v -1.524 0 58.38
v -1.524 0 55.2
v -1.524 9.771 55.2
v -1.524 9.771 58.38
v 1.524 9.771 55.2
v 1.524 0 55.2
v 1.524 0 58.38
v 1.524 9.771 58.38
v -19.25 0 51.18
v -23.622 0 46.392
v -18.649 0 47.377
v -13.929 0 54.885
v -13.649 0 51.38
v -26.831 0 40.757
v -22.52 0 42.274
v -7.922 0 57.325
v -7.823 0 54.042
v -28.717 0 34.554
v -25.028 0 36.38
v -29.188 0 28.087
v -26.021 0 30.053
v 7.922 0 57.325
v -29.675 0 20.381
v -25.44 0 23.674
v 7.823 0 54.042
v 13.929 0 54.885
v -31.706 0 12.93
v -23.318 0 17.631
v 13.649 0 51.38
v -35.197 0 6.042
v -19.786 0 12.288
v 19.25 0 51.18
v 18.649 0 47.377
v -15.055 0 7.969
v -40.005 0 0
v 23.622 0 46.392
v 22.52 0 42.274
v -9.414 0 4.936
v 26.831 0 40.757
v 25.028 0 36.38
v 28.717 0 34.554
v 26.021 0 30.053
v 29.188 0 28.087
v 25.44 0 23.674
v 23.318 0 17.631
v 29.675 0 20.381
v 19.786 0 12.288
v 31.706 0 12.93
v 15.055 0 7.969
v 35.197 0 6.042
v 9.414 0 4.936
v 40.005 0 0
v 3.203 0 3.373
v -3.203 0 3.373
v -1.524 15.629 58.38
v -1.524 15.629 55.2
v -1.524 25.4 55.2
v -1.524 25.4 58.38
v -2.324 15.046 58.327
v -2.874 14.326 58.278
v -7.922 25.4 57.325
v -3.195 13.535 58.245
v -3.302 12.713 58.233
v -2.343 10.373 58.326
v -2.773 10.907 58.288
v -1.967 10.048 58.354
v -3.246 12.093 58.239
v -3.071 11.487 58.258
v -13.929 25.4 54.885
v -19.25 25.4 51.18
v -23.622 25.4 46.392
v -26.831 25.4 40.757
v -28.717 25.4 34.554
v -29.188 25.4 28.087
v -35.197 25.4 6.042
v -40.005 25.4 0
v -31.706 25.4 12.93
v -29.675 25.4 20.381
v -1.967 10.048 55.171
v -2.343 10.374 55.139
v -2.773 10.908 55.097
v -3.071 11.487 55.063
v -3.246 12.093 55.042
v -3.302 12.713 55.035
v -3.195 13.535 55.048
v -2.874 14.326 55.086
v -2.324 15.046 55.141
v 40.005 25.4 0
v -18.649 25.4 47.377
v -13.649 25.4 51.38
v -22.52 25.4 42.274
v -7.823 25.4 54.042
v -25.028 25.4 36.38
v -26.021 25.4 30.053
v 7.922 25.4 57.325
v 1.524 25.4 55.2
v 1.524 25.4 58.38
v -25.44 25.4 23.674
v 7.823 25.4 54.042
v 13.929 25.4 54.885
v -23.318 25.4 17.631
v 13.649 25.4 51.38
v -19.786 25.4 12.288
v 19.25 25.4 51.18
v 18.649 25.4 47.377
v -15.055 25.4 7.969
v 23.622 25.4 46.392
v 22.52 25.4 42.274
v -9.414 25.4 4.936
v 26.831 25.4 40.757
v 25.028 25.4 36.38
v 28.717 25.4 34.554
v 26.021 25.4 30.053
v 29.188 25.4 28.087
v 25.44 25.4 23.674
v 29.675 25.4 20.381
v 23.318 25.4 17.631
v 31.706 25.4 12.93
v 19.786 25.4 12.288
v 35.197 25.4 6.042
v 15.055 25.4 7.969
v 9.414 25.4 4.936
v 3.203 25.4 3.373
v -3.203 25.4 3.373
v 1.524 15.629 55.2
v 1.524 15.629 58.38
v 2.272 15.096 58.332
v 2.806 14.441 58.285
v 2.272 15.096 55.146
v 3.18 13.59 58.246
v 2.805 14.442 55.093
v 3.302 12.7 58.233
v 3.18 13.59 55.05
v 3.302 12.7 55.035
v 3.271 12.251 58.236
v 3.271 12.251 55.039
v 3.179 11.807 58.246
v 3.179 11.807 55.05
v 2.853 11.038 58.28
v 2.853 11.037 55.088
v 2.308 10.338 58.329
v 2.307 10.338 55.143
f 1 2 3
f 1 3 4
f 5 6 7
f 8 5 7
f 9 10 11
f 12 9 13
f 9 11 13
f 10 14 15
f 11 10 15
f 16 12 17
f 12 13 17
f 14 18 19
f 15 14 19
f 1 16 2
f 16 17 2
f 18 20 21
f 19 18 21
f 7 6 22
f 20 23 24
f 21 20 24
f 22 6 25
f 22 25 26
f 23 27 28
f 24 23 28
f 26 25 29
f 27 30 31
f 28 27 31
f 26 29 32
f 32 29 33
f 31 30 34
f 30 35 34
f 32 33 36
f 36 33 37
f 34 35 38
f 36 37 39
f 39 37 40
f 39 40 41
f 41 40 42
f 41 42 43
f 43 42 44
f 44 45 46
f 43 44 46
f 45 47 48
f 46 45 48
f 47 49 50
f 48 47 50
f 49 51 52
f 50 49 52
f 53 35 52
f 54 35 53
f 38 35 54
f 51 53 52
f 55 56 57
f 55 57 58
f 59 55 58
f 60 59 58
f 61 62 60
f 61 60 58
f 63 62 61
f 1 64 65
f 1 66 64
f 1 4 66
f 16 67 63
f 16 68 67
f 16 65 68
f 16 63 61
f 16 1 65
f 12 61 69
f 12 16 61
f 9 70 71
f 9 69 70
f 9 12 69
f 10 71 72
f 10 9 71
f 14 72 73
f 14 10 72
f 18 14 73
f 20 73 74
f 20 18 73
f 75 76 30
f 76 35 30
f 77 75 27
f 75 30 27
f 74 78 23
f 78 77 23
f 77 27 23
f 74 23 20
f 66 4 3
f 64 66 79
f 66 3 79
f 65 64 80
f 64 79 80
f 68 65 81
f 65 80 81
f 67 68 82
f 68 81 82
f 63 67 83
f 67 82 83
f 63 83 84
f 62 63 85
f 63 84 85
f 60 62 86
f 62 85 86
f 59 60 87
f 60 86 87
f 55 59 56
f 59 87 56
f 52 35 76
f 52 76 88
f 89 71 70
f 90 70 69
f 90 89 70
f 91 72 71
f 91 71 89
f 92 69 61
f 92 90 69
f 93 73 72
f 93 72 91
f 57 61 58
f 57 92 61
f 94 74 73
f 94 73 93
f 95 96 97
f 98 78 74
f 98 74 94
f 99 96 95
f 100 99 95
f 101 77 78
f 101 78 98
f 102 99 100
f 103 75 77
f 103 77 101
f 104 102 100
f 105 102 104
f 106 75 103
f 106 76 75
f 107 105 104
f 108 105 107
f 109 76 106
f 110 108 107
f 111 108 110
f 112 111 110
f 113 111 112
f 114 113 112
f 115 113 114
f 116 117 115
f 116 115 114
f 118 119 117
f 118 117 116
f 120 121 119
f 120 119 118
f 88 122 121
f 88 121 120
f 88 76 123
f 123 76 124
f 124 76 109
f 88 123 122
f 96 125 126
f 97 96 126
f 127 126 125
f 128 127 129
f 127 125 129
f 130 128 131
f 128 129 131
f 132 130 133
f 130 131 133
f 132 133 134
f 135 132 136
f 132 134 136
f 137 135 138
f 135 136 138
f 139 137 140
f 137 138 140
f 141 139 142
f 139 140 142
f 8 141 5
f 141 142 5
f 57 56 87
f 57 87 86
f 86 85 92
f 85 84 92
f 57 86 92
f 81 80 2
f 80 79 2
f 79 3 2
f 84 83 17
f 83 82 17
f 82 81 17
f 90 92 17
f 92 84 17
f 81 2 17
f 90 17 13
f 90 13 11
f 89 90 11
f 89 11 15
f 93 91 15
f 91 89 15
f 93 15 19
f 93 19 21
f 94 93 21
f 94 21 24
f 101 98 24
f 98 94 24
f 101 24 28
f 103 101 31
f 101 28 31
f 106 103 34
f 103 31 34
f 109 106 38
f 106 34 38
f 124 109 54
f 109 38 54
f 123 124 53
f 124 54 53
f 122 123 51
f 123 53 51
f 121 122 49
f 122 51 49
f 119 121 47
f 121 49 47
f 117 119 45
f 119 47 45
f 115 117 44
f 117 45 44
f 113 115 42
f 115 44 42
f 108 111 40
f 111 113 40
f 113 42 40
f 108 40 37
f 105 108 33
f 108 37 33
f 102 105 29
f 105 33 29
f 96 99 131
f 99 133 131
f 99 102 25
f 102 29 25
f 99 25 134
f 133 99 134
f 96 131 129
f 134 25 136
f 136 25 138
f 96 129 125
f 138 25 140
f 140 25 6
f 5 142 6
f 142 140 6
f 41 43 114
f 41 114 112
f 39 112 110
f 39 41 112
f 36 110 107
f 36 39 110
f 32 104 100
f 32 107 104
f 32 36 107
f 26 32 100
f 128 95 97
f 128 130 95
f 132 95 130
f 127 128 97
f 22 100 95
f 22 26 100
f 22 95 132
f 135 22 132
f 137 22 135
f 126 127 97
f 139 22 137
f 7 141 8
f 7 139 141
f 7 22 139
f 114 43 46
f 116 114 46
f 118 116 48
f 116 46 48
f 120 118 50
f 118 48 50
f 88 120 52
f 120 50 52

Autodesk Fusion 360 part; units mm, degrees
sketch "Sketch1" plane through (0, 0, 0) normal (0, 1, 0) x (1, 0, 0)
  line L0 (-40.005, 0) -> (40.005, 0)
  line L1 (0, -29.21) -> (0, 0) construction
  line L2 (-1.524, -55.2004) -> (-1.524, -58.3802)
  line L3 (1.524, -55.2004) -> (1.524, -58.3802)
  line L4 (-1.524, -56.7903) -> (1.524, -56.7903) construction
  arc A0 (1.524, -55.2004) -> (-1.524, -55.2004) centre (0, -29.21) ccw
  arc A1 (40.005, 0) -> (29.1884, -28.0872) centre (67.2603, -26.6226) ccw
  arc A2 (-29.1884, -28.0872) -> (-40.005, 0) centre (-67.2603, -26.6226) ccw
  arc A3 (1.524, -58.3802) -> (29.1884, -28.0872) centre (0, -29.21) ccw
  arc A4 (-29.1884, -28.0872) -> (-1.524, -58.3802) centre (0, -29.21) ccw
  dimension "d1" = 52.07
  dimension "d2" = 29.21
  dimension "d3" = 80.01
  dimension "d4" = 58.42
  dimension "d5" = 3.048
  dimension "d7" = 38.1
extrude "Extrude1" add sketch "Sketch1" along normal blind 25.4
sketch "Sketch2" plane through (0, 0, 0) normal (0, 0, 1) x (1, 0, 0)
  circle A0 centre (0, 12.7) radius 3.302
  line L0 (-1.524, 25.4) -> (-29.21, 25.4)
  line L1 (-1.524, 0) -> (-29.21, 0)
  line L2 (-5.6643, 25.4) -> (-5.6643, 0) construction
  line L3 (-5.6643, 12.7) -> (0, 12.7) construction
  line L4 (1.524, 0) -> (1.524, 25.4) construction
  line L5 (-1.524, 0) -> (-1.524, 25.4) construction
  line L6 (0, 12.7) -> (0, 14.224) construction
  line L7 (0, 14.224) -> (-1.524, 14.224) construction
  line L8 (0, 14.224) -> (1.524, 14.224) construction
  dimension "d10" = 6.604
extrude "Extrude2" cut sketch "Sketch2" along normal blind 65.6387 and the other way blind -9.7561
